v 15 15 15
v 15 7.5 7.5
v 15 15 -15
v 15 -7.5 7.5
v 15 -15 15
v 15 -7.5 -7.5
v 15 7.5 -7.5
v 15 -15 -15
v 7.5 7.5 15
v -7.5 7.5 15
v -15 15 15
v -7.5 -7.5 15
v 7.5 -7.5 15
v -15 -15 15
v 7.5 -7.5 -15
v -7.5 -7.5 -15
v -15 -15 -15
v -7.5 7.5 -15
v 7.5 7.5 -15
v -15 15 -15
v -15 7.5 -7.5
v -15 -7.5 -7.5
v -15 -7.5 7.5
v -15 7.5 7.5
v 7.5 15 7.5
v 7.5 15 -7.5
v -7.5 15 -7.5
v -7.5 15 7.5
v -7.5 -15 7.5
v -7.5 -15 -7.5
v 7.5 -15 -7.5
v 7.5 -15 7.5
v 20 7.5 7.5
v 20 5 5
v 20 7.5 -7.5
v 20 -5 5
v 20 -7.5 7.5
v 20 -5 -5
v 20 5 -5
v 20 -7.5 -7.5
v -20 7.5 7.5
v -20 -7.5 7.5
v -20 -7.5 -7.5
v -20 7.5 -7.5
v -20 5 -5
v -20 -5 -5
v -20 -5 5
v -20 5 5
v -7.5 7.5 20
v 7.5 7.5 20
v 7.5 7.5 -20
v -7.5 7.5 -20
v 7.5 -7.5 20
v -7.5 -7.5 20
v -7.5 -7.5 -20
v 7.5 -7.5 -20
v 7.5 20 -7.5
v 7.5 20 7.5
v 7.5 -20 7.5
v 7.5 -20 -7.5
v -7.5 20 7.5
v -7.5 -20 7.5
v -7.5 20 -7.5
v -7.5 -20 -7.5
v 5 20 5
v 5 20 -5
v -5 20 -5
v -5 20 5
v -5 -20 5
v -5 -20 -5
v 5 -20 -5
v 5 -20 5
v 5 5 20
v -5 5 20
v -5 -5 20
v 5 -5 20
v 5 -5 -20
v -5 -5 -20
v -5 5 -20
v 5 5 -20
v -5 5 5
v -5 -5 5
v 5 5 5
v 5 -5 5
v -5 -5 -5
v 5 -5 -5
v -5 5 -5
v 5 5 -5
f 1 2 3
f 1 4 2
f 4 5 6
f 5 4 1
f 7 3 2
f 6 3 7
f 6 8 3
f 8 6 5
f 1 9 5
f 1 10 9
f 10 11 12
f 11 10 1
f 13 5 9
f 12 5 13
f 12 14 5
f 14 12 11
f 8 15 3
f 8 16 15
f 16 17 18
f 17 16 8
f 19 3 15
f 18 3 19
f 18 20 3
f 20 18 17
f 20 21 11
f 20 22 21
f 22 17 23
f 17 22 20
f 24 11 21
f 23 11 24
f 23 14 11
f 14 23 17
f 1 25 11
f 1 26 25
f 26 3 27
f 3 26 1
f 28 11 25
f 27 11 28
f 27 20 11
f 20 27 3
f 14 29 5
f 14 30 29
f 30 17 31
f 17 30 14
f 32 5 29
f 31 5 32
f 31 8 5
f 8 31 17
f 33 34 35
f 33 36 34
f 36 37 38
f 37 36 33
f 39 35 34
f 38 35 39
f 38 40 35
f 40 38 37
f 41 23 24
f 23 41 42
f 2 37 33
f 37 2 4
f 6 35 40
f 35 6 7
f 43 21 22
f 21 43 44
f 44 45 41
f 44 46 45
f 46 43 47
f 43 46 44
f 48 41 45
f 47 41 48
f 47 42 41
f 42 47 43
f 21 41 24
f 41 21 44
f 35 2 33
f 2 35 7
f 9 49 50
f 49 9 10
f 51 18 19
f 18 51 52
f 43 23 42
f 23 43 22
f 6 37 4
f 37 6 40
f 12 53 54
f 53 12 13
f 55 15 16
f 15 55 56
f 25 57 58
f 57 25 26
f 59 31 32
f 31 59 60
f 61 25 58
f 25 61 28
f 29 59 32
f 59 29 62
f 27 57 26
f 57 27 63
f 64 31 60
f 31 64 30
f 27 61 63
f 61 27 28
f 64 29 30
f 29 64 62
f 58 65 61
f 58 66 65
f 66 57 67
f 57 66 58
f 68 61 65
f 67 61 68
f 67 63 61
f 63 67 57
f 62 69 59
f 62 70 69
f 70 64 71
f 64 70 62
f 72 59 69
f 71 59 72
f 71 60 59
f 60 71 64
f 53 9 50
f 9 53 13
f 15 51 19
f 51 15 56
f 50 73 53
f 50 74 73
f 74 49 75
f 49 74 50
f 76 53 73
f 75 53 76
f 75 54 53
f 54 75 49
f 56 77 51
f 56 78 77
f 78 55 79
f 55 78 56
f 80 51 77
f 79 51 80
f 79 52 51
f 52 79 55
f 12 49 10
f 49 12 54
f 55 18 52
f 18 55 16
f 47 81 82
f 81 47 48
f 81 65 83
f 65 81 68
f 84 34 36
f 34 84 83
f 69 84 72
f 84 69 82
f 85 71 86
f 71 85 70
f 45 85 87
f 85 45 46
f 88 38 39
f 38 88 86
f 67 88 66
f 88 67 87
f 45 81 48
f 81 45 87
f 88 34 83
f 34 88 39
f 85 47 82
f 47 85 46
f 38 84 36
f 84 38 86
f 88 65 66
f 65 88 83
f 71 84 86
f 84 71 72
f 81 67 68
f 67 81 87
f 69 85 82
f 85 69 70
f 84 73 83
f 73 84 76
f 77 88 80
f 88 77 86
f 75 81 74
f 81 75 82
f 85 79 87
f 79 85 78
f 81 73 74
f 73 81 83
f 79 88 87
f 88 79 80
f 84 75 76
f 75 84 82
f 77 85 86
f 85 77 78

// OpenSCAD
//created with rubyscad 1.0

difference() {
   union() {
      cube(size = 30, center = true); 
      cube(size = [40, 15, 15], center = true); 
      cube(size = [15, 40, 15], center = true); 
      cube(size = [15, 15, 40], center = true); 
   }
   union() {
      cube(size = [50, 10, 10], center = true); 
      cube(size = [10, 50, 10], center = true); 
      cube(size = [10, 10, 50], center = true); 
   }
}
